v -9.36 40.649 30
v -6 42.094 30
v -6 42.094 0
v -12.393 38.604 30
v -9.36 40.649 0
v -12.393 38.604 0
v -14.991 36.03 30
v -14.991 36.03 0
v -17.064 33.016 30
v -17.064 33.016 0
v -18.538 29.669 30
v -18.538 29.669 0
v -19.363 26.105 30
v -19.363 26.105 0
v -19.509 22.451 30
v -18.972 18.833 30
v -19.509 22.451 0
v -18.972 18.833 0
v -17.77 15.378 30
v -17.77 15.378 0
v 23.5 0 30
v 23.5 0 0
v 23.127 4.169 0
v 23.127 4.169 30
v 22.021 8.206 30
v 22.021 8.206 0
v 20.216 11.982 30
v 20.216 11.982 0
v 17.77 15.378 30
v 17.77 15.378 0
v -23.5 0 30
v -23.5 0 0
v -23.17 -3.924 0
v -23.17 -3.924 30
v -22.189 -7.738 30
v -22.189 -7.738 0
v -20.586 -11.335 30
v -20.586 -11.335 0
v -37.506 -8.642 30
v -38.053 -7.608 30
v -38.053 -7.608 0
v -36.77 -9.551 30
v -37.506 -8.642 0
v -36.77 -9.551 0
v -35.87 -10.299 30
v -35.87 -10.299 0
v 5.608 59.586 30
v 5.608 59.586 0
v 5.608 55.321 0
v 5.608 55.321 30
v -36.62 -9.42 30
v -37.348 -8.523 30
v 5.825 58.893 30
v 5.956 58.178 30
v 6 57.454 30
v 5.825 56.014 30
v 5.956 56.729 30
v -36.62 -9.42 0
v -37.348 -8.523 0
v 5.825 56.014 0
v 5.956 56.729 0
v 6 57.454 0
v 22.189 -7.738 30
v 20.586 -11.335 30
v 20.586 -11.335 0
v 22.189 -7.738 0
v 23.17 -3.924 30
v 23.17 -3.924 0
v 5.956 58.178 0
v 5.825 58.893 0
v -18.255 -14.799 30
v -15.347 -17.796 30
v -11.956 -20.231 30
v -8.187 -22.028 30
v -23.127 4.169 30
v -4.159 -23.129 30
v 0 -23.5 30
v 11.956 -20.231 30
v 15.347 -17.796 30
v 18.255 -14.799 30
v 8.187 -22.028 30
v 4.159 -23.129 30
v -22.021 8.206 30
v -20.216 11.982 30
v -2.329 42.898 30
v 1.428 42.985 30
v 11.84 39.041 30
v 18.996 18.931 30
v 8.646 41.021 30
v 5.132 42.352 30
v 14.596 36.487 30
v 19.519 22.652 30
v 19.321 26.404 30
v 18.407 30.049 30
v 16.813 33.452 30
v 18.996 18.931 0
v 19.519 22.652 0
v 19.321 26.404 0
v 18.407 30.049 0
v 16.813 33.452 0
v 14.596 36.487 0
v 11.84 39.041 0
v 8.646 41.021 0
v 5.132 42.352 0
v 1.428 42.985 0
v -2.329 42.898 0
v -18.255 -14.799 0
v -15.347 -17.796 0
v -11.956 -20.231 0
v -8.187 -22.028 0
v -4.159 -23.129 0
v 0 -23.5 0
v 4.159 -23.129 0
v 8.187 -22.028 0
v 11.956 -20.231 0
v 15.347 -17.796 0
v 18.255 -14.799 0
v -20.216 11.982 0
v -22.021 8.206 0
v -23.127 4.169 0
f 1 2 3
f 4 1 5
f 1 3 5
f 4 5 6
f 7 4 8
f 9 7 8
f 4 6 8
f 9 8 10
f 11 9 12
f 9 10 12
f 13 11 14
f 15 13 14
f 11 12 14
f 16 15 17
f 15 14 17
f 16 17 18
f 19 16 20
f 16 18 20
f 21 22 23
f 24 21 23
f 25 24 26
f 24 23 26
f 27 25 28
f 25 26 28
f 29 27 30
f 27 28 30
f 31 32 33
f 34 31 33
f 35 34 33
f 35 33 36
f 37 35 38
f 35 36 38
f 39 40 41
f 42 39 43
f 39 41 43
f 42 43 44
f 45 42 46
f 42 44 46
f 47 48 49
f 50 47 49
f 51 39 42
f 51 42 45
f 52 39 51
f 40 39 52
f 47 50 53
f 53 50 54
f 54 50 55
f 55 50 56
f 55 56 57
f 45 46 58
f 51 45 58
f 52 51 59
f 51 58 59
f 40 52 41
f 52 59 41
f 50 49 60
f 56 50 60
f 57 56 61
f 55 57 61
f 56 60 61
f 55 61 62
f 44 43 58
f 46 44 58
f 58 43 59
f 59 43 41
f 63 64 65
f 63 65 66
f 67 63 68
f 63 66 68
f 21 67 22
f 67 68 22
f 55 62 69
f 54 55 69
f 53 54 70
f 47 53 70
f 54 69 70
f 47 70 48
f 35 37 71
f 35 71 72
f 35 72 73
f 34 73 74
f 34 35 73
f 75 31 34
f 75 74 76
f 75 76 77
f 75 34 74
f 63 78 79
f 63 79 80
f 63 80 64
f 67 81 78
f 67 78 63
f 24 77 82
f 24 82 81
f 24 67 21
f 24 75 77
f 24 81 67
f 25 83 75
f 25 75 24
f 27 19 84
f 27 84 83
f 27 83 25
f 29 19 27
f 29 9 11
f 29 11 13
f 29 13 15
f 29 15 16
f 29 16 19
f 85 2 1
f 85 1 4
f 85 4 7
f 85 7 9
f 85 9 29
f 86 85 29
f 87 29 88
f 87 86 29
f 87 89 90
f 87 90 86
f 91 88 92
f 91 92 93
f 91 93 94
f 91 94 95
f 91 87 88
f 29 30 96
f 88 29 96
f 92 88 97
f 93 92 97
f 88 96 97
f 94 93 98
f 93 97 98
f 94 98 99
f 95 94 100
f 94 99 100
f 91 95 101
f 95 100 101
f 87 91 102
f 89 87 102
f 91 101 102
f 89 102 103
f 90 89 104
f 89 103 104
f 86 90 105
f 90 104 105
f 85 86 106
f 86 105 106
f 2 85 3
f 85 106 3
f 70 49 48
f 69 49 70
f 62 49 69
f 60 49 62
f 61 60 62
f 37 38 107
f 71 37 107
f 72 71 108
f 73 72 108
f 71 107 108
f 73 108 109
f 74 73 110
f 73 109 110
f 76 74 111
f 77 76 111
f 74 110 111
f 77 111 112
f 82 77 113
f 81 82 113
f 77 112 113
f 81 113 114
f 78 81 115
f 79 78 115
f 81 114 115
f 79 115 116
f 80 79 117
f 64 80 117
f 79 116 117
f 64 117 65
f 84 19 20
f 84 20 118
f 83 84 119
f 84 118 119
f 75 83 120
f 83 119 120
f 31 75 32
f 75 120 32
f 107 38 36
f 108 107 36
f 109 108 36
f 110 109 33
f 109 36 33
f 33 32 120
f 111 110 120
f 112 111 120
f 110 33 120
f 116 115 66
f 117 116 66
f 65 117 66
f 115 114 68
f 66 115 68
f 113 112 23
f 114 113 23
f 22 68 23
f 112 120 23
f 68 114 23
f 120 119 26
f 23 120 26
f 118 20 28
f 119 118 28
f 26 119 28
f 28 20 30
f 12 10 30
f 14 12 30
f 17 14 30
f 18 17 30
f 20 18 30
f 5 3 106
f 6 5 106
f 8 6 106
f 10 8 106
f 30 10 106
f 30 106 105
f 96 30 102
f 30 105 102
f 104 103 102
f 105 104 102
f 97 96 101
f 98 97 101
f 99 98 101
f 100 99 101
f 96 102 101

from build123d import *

# Parameters (mm, degrees)
F1_DEPTH = 30


with BuildPart() as f1:
    # F0 (on Top) → F1 (new body)
    with BuildSketch(Plane.XY):
        with BuildLine():
            ThreePointArc((-7.1621949879, 10.849099638), (-6.1600107613, -11.4478935801), (13, 0))
            ThreePointArc((13, 0), (11.4478935801, 6.1600107613), (7.1621949879, 10.849099638))
            ThreePointArc((7.1621949879, 10.849099638), (0, 8.9623826913), (-7.1621949879, 10.849099638))
        make_face()
        with BuildLine():
            ThreePointArc((7.1621949879, 10.849099638), (11.4478935801, 6.1600107613), (13, 0))
            ThreePointArc((13, 0), (-6.1600107613, -11.4478935801), (-7.1621949879, 10.849099638))
            ThreePointArc((-7.1621949879, 10.849099638), (-10.0406665828, 12.9868020286), (-12.3083921231, 15.763993255))
            ThreePointArc((-12.3083921231, 15.763993255), (-8.7701812278, -17.9745353551), (20, 0))
            ThreePointArc((20, 0), (17.9745353551, 8.7701812278), (12.3083921231, 15.763993255))
            ThreePointArc((12.3083921231, 15.763993255), (10.0406665828, 12.9868020286), (7.1621949879, 10.849099638))
        make_face()
        with BuildLine():
            ThreePointArc((-7.1621949879, 10.849099638), (0, 8.9623826913), (7.1621949879, 10.849099638))
            ThreePointArc((7.1621949879, 10.849099638), (0, 13), (-7.1621949879, 10.849099638))
        make_face()
        with BuildLine():
            ThreePointArc((-7.1621949879, 10.849099638), (0, 13), (7.1621949879, 10.849099638))
            ThreePointArc((7.1621949879, 10.849099638), (10.0406665828, 12.9868020286), (12.3083921231, 15.763993255))
            ThreePointArc((12.3083921231, 15.763993255), (0, 20), (-12.3083921231, 15.763993255))
            ThreePointArc((-12.3083921231, 15.763993255), (-10.0406665828, 12.9868020286), (-7.1621949879, 10.849099638))
        make_face()
        with BuildLine():
            ThreePointArc((13.8247061586, 19.0033549572), (13.1665512762, 17.336864069), (12.3083921231, 15.763993255))
            ThreePointArc((12.3083921231, 15.763993255), (17.9745353551, 8.7701812278), (20, 0))
            ThreePointArc((20, 0), (-8.7701812278, -17.9745353551), (-12.3083921231, 15.763993255))
            ThreePointArc((-12.3083921231, 15.763993255), (-13.1665512762, 17.336864069), (-13.8247061586, 19.0033549572))
            ThreePointArc((-13.8247061586, 19.0033549572), (-15.9007698993, 17.3036272674), (-17.7695516679, 15.3783299979))
            ThreePointArc((-17.7695516679, 15.3783299979), (-22.0208363169, 8.2056546297), (-23.5, 0))
            ThreePointArc((-23.5, 0), (-22.7597361756, -5.851872283), (-20.5855821944, -11.3350697272))
            ThreePointArc((-20.5855821944, -11.3350697272), (0, -23.5), (20.5855821944, -11.3350697272))
            ThreePointArc((20.5855821944, -11.3350697272), (22.7597361756, -5.851872283), (23.5, 0))
            ThreePointArc((23.5, 0), (22.0208363169, 8.2056546297), (17.7695516679, 15.3783299979))
            ThreePointArc((17.7695516679, 15.3783299979), (15.9007698993, 17.3036272674), (13.8247061586, 19.0033549572))
        make_face()
        with BuildLine():
            ThreePointArc((-12.3083921231, 15.763993255), (0, 20), (12.3083921231, 15.763993255))
            ThreePointArc((12.3083921231, 15.763993255), (13.1665512762, 17.336864069), (13.8247061586, 19.0033549572))
            ThreePointArc((13.8247061586, 19.0033549572), (3.6269971249, 23.2184170833), (-7.3703918295, 22.3142852066))
            ThreePointArc((-7.3703918295, 22.3142852066), (-10.7260714831, 20.9093613135), (-13.8247061586, 19.0033549572))
            ThreePointArc((-13.8247061586, 19.0033549572), (-13.1665512762, 17.336864069), (-12.3083921231, 15.763993255))
        make_face()
        with BuildLine():
            ThreePointArc((14.5376173087, 23.5), (14.3582834028, 21.2235960953), (13.8247061586, 19.0033549572))
            ThreePointArc((13.8247061586, 19.0033549572), (15.9007698993, 17.3036272674), (17.7695516679, 15.3783299979))
            ThreePointArc((17.7695516679, 15.3783299979), (17.7957261948, 31.5641564532), (5.6083085947, 42.2153777629))
            ThreePointArc((5.6083085947, 42.2153777629), (-0.2051065098, 43.0365406718), (-6, 42.093506665))
            ThreePointArc((-6, 42.093506665), (-17.8794033097, 31.3768919879), (-17.7695516679, 15.3783299979))
            ThreePointArc((-17.7695516679, 15.3783299979), (-15.9007698993, 17.3036272674), (-13.8247061586, 19.0033549572))
            ThreePointArc((-13.8247061586, 19.0033549572), (-2.2764039047, 37.8582834028), (14.5376173087, 23.5))
        make_face()
        with BuildLine():
            ThreePointArc((-7.3703918295, 22.3142852066), (3.6269971249, 23.2184170833), (13.8247061586, 19.0033549572))
            ThreePointArc((13.8247061586, 19.0033549572), (14.3582834028, 21.2235960953), (14.5376173087, 23.5))
            ThreePointArc((14.5376173087, 23.5), (-2.2764039047, 37.8582834028), (-13.8247061586, 19.0033549572))
            ThreePointArc((-13.8247061586, 19.0033549572), (-10.7260714831, 20.9093613135), (-7.3703918295, 22.3142852066))
        make_face()
    extrude(amount=F1_DEPTH)


with BuildPart() as f1b:
    # F0 (on Top) → F1, piece 2 (new body)
    with BuildSketch(Plane.XY):
        with BuildLine():
            Line((5.6083085947, 59.5858506858), (5.6083085947, 55.321170296))
            ThreePointArc((5.6083085947, 55.321170296), (5.9012647614, 56.3695020887), (6, 57.4535104909))
            ThreePointArc((6, 57.4535104909), (5.9012647614, 58.5375188931), (5.6083085947, 59.5858506858))
        make_face()
    extrude(amount=F1_DEPTH)


with BuildPart() as f1c:
    # F0 (on Top) → F1, piece 3 (new body)
    with BuildSketch(Plane.XY):
        with BuildLine():
            ThreePointArc((-38.0529754103, -7.6076154565), (-37.1602081866, -9.1142838858), (-35.8704063618, -10.2989755437))
            ThreePointArc((-35.8704063618, -10.2989755437), (-36.9865719452, -8.9734728929), (-38.0529754103, -7.6076154565))
        make_face()
    extrude(amount=F1_DEPTH)


solid = Compound([f1.part, f1b.part, f1c.part])
